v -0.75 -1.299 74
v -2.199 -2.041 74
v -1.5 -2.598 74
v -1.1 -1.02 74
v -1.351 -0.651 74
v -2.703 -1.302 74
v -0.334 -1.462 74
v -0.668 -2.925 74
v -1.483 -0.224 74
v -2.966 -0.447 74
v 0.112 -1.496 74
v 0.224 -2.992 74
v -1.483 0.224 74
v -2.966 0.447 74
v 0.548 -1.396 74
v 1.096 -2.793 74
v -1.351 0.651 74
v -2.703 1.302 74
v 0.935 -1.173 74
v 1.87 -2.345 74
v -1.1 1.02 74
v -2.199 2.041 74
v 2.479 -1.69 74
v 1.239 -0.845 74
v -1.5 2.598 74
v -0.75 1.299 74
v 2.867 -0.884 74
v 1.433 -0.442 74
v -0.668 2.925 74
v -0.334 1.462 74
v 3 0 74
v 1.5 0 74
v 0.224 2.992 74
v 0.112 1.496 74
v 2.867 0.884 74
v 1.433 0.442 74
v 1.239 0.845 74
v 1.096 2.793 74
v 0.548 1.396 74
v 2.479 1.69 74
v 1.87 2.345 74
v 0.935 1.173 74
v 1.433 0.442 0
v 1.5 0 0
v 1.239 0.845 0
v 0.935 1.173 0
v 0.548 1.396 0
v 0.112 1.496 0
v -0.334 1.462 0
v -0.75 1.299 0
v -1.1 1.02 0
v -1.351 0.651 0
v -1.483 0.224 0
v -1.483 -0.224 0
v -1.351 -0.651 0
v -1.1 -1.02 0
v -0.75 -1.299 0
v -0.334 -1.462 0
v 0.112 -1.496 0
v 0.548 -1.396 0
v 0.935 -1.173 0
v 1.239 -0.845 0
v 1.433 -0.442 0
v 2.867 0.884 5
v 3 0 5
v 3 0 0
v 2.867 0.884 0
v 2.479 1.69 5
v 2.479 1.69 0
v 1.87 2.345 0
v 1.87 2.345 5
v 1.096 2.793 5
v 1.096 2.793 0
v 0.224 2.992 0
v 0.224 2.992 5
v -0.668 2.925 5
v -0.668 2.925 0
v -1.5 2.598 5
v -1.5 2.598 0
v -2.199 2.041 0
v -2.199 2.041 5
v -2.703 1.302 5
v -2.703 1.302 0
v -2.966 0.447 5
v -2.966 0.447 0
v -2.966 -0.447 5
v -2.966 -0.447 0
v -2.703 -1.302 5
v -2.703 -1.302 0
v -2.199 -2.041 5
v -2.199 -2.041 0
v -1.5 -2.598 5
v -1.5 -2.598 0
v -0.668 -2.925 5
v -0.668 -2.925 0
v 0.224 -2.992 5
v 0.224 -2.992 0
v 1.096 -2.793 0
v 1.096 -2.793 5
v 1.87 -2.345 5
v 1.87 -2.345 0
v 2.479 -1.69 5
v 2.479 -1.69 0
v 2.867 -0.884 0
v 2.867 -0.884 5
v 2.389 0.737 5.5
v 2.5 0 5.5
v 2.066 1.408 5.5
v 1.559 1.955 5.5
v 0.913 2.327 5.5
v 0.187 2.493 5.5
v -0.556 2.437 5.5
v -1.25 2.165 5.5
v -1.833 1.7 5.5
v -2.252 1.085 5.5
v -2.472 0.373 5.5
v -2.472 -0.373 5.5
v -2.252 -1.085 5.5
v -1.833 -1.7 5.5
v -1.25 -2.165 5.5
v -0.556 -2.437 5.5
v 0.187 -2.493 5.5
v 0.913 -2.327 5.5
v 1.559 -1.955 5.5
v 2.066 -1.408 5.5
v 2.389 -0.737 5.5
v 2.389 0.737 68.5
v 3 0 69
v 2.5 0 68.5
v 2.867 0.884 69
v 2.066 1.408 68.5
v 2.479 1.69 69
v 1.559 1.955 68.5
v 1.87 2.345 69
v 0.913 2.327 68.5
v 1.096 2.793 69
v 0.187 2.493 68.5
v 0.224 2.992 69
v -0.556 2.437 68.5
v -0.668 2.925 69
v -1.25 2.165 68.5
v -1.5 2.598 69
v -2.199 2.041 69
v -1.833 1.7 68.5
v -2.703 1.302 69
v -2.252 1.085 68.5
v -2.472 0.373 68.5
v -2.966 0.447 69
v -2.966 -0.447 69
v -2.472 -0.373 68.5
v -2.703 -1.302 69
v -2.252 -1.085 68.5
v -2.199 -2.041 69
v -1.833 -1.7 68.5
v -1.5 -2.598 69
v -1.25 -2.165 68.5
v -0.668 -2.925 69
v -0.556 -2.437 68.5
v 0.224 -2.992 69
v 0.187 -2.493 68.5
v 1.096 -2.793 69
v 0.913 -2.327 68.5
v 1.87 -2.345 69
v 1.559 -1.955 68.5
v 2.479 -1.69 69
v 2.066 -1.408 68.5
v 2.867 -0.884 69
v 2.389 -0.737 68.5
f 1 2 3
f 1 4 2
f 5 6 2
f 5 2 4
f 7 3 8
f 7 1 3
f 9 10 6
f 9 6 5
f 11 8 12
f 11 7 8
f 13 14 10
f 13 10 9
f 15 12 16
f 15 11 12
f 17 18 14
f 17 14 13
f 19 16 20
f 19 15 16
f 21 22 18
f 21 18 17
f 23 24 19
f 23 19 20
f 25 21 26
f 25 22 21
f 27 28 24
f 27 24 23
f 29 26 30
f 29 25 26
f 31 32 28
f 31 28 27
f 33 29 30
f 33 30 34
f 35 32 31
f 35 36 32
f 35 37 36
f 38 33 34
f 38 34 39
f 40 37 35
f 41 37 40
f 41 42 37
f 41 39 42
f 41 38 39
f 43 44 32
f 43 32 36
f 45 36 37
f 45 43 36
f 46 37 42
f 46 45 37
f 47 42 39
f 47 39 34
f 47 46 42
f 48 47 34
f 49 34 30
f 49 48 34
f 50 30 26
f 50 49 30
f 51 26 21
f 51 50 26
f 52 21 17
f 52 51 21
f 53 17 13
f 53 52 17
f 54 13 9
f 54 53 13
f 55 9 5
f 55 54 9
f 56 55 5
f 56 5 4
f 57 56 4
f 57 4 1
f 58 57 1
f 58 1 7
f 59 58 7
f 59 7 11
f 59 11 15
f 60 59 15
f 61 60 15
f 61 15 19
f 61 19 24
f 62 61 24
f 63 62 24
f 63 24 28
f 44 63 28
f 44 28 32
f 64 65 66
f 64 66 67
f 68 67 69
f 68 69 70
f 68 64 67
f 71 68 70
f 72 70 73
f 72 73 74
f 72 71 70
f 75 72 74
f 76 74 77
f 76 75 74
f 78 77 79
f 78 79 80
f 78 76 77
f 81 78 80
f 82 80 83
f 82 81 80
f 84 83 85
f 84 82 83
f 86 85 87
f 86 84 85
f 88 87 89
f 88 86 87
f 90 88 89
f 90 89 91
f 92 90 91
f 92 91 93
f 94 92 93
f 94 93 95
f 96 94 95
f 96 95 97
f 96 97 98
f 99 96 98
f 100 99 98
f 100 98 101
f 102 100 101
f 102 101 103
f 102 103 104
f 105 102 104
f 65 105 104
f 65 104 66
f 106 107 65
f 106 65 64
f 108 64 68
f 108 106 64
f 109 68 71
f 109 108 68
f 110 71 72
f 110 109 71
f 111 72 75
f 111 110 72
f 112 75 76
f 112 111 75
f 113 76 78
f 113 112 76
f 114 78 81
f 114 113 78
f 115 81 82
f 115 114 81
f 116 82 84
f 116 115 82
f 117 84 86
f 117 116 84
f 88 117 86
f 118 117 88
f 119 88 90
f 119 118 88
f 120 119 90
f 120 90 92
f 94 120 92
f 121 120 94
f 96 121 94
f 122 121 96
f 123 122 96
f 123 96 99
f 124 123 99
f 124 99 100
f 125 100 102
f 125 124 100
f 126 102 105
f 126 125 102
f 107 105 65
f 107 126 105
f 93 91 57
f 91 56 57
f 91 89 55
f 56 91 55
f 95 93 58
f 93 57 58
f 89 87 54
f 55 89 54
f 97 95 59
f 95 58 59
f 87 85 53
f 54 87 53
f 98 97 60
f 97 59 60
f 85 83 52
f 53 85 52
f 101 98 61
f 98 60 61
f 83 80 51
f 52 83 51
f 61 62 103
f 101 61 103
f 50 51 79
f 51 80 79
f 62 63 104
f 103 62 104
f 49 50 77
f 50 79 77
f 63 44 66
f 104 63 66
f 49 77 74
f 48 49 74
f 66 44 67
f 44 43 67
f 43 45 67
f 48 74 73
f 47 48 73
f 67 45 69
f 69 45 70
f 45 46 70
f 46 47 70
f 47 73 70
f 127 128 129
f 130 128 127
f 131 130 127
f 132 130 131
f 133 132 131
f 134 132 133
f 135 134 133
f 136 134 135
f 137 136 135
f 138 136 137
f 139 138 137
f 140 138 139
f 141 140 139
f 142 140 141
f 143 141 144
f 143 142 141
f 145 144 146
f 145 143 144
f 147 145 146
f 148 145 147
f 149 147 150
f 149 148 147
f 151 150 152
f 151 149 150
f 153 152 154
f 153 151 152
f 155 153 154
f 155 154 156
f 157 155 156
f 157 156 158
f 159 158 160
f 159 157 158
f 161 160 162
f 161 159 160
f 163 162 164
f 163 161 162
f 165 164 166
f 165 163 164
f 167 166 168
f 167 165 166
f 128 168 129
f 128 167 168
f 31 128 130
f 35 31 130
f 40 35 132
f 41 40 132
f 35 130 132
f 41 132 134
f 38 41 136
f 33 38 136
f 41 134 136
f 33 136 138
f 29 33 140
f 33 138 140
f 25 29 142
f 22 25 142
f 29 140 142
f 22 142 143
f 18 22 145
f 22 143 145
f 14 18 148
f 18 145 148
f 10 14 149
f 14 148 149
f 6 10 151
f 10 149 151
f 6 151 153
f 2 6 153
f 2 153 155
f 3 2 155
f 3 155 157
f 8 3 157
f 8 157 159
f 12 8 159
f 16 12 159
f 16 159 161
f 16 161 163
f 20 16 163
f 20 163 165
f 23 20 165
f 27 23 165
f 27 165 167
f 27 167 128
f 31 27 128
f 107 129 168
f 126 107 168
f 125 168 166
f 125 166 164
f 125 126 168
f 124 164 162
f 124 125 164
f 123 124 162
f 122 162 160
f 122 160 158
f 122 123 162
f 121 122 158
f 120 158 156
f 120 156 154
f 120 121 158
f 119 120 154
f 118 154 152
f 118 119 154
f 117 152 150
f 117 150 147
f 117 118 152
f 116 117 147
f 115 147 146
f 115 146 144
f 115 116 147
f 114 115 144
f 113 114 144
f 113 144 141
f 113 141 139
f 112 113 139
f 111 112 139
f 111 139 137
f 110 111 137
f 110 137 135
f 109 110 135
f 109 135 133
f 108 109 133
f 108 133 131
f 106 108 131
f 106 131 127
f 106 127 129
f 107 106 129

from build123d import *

# Parameters (mm, degrees)
SKETCH1_R                = 2.5
SKETCH1_R_2              = 1.5
BOSS_EXTRUDE1_DEPTH      = 74
BOSS_EXTRUDE2_START      = -6
SKETCH2_R                = 3
SKETCH2_R_2              = 1.5
BOSS_EXTRUDE2_DEPTH      = 6
CHAMFER1_SIZE            = 1
CHAMFER1_OF_MIRROR1_SIZE = 1


with BuildPart() as part:
    # Sketch1 → Boss-Extrude1 (new body)
    with BuildSketch(Plane.XY):
        Circle(SKETCH1_R)
        Circle(SKETCH1_R_2, mode=Mode.SUBTRACT)
    extrude(amount=BOSS_EXTRUDE1_DEPTH)

    # Sketch2 → Boss-Extrude2 (add)
    with BuildSketch(Plane.XY.offset(74).offset(BOSS_EXTRUDE2_START)):
        Circle(SKETCH2_R)
        Circle(SKETCH2_R_2, mode=Mode.SUBTRACT)
    boss_extrude2 = extrude(amount=BOSS_EXTRUDE2_DEPTH)

    # Chamfer1
    # the kernel refuses this chamfer: 1 mm, written as the material it takes off along each edge
    with BuildSketch(Plane(origin=(0, 0, 68), x_dir=(1, 0, 0), z_dir=(0, -1, 0))) as chamfer1_piece_1_section:
        Polygon((3 - CHAMFER1_SIZE, 0), (3, CHAMFER1_SIZE), (3, 0), align=None)
    chamfer1_piece_1 = revolve(axis=Axis((0, 0, 68), (0, 0, 1)), mode=Mode.PRIVATE)
    chamfer1_piece_1 = chamfer1_piece_1 - Plane(origin=(0, 0, 68.750504242), x_dir=(1, 0, 0), z_dir=(0, 0, -1)) * Cylinder(2.5, 12, mode=Mode.PRIVATE)
    add(chamfer1_piece_1, mode=Mode.SUBTRACT)

    # Mirror1: Boss-Extrude2 across plane
    add(boss_extrude2.mirror(Plane.XY.offset(37)))

    # Chamfer1 of Mirror1
    # the kernel refuses this chamfer: 1 mm, written as the material it takes off along each edge
    with BuildSketch(Plane(origin=(0, 0, 6), x_dir=(1, 0, 0), z_dir=(0, -1, 0))) as chamfer1_of_mirror1_piece_1_section:
        Polygon((3, -CHAMFER1_OF_MIRROR1_SIZE), (3 - CHAMFER1_OF_MIRROR1_SIZE, 0), (3, 0), align=None)
    chamfer1_of_mirror1_piece_1 = revolve(axis=Axis((0, 0, 6), (0, 0, 1)), mode=Mode.PRIVATE)
    chamfer1_of_mirror1_piece_1 = chamfer1_of_mirror1_piece_1 - Plane(origin=(0, 0, 5.249495758), x_dir=(1, 0, 0), z_dir=(0, 0, -1)) * Cylinder(2.5, 12, mode=Mode.PRIVATE)
    add(chamfer1_of_mirror1_piece_1, mode=Mode.SUBTRACT)


solid = part.part
